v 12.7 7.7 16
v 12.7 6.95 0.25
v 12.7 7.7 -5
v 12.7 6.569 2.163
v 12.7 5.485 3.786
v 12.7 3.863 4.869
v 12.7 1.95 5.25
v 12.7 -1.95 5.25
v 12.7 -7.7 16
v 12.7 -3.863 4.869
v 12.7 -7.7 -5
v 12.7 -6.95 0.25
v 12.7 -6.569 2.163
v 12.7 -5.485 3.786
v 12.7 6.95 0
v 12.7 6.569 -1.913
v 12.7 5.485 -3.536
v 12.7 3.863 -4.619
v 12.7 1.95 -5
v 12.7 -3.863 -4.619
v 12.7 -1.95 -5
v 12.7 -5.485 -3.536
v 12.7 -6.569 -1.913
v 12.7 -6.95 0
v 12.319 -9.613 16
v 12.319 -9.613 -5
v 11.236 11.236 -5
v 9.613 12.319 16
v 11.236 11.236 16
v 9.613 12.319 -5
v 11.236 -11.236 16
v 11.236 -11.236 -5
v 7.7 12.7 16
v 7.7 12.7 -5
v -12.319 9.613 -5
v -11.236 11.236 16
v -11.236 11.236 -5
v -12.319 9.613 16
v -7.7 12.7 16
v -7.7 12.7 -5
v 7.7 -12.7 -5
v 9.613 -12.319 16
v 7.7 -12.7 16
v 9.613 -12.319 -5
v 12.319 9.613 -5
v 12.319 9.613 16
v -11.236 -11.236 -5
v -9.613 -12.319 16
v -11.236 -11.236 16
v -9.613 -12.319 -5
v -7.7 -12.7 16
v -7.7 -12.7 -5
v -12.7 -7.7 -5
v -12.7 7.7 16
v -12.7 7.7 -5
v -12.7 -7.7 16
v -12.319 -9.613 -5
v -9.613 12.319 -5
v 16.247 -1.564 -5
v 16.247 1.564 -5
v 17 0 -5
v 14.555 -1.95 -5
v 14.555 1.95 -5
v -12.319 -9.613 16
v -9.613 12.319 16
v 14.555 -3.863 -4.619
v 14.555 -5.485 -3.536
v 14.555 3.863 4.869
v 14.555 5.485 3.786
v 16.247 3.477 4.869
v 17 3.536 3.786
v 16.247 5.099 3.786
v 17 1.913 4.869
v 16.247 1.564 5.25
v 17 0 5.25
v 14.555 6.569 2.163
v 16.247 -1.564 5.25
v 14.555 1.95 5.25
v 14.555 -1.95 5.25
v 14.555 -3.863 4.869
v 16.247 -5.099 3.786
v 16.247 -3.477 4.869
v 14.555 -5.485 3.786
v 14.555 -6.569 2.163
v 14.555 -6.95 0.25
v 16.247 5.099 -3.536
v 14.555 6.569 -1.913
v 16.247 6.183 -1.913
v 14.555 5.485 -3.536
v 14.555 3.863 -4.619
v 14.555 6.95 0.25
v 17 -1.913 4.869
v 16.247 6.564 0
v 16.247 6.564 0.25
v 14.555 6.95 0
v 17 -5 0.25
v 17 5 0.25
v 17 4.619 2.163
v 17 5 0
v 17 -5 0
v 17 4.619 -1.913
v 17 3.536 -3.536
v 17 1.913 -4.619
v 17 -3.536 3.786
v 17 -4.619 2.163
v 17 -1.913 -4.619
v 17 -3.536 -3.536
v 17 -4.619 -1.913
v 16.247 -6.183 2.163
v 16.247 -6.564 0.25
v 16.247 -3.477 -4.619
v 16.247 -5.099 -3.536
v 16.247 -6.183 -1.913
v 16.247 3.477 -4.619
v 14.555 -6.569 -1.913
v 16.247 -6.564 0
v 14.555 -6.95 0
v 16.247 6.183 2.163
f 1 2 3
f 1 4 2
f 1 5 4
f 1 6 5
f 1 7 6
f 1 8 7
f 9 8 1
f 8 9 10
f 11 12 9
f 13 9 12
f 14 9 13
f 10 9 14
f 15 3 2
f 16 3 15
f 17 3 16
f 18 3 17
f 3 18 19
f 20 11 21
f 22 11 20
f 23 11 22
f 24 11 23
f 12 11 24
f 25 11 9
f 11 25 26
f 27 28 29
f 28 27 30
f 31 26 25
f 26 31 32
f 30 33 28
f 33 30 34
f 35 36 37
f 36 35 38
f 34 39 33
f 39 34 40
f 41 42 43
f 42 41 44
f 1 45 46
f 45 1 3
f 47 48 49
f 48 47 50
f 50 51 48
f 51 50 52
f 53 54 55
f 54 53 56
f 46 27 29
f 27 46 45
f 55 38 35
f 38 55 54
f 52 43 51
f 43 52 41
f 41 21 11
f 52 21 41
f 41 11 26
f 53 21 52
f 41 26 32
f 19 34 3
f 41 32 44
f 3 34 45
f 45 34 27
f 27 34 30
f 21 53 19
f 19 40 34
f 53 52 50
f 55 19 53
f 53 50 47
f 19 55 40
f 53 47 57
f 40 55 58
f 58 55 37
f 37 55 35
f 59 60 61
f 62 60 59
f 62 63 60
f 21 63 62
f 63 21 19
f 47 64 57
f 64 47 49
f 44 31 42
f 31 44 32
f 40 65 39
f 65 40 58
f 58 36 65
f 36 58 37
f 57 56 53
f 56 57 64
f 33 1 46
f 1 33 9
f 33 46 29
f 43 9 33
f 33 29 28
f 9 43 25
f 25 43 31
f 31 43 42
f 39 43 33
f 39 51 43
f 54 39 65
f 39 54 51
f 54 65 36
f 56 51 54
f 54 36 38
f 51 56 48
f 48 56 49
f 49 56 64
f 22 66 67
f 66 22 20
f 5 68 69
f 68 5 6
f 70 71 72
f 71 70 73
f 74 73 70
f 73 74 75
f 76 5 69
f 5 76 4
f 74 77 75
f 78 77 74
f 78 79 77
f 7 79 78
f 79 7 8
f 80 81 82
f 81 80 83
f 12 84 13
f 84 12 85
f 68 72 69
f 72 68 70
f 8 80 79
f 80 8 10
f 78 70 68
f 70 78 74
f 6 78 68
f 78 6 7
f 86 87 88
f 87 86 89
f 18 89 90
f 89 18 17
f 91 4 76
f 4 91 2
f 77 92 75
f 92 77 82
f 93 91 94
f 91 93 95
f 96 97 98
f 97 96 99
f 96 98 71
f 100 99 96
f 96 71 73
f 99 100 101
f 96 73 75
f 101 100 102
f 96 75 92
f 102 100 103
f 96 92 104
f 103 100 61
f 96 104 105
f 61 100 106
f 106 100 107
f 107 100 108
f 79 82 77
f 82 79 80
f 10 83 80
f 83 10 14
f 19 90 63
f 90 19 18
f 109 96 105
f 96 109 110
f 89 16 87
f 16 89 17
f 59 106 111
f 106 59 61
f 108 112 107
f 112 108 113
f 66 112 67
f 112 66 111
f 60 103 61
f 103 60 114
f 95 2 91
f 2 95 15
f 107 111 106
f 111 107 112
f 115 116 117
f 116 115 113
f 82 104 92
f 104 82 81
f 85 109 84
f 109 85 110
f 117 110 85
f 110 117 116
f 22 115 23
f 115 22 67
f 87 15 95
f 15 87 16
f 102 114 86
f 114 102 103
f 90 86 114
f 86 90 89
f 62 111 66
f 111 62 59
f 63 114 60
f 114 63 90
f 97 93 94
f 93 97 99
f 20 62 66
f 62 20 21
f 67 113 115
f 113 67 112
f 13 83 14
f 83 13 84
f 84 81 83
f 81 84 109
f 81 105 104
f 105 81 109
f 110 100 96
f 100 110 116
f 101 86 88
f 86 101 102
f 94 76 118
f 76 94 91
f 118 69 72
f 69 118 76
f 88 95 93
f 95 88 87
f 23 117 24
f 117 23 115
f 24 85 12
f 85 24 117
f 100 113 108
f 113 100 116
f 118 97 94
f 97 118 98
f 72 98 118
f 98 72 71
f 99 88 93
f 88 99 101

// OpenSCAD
// corpus 20753: a lying cylinder rounded by a thin disk (two curved convex bodies on different axes:
// the mesh route) fused onto the rounded plate it stands on — the sum's floor lies in the plate's.
union() {
  minkowski() {
    translate([0, 0, 5]) cube([15.4, 15.4, 20], center = true);
    cylinder(r = 5, h = 1);
  }
  minkowski() {
    rotate([0, 90, 0]) cylinder(h = 15, r = 5);
    cylinder(r = 2, h = 0.25);
  }
}
